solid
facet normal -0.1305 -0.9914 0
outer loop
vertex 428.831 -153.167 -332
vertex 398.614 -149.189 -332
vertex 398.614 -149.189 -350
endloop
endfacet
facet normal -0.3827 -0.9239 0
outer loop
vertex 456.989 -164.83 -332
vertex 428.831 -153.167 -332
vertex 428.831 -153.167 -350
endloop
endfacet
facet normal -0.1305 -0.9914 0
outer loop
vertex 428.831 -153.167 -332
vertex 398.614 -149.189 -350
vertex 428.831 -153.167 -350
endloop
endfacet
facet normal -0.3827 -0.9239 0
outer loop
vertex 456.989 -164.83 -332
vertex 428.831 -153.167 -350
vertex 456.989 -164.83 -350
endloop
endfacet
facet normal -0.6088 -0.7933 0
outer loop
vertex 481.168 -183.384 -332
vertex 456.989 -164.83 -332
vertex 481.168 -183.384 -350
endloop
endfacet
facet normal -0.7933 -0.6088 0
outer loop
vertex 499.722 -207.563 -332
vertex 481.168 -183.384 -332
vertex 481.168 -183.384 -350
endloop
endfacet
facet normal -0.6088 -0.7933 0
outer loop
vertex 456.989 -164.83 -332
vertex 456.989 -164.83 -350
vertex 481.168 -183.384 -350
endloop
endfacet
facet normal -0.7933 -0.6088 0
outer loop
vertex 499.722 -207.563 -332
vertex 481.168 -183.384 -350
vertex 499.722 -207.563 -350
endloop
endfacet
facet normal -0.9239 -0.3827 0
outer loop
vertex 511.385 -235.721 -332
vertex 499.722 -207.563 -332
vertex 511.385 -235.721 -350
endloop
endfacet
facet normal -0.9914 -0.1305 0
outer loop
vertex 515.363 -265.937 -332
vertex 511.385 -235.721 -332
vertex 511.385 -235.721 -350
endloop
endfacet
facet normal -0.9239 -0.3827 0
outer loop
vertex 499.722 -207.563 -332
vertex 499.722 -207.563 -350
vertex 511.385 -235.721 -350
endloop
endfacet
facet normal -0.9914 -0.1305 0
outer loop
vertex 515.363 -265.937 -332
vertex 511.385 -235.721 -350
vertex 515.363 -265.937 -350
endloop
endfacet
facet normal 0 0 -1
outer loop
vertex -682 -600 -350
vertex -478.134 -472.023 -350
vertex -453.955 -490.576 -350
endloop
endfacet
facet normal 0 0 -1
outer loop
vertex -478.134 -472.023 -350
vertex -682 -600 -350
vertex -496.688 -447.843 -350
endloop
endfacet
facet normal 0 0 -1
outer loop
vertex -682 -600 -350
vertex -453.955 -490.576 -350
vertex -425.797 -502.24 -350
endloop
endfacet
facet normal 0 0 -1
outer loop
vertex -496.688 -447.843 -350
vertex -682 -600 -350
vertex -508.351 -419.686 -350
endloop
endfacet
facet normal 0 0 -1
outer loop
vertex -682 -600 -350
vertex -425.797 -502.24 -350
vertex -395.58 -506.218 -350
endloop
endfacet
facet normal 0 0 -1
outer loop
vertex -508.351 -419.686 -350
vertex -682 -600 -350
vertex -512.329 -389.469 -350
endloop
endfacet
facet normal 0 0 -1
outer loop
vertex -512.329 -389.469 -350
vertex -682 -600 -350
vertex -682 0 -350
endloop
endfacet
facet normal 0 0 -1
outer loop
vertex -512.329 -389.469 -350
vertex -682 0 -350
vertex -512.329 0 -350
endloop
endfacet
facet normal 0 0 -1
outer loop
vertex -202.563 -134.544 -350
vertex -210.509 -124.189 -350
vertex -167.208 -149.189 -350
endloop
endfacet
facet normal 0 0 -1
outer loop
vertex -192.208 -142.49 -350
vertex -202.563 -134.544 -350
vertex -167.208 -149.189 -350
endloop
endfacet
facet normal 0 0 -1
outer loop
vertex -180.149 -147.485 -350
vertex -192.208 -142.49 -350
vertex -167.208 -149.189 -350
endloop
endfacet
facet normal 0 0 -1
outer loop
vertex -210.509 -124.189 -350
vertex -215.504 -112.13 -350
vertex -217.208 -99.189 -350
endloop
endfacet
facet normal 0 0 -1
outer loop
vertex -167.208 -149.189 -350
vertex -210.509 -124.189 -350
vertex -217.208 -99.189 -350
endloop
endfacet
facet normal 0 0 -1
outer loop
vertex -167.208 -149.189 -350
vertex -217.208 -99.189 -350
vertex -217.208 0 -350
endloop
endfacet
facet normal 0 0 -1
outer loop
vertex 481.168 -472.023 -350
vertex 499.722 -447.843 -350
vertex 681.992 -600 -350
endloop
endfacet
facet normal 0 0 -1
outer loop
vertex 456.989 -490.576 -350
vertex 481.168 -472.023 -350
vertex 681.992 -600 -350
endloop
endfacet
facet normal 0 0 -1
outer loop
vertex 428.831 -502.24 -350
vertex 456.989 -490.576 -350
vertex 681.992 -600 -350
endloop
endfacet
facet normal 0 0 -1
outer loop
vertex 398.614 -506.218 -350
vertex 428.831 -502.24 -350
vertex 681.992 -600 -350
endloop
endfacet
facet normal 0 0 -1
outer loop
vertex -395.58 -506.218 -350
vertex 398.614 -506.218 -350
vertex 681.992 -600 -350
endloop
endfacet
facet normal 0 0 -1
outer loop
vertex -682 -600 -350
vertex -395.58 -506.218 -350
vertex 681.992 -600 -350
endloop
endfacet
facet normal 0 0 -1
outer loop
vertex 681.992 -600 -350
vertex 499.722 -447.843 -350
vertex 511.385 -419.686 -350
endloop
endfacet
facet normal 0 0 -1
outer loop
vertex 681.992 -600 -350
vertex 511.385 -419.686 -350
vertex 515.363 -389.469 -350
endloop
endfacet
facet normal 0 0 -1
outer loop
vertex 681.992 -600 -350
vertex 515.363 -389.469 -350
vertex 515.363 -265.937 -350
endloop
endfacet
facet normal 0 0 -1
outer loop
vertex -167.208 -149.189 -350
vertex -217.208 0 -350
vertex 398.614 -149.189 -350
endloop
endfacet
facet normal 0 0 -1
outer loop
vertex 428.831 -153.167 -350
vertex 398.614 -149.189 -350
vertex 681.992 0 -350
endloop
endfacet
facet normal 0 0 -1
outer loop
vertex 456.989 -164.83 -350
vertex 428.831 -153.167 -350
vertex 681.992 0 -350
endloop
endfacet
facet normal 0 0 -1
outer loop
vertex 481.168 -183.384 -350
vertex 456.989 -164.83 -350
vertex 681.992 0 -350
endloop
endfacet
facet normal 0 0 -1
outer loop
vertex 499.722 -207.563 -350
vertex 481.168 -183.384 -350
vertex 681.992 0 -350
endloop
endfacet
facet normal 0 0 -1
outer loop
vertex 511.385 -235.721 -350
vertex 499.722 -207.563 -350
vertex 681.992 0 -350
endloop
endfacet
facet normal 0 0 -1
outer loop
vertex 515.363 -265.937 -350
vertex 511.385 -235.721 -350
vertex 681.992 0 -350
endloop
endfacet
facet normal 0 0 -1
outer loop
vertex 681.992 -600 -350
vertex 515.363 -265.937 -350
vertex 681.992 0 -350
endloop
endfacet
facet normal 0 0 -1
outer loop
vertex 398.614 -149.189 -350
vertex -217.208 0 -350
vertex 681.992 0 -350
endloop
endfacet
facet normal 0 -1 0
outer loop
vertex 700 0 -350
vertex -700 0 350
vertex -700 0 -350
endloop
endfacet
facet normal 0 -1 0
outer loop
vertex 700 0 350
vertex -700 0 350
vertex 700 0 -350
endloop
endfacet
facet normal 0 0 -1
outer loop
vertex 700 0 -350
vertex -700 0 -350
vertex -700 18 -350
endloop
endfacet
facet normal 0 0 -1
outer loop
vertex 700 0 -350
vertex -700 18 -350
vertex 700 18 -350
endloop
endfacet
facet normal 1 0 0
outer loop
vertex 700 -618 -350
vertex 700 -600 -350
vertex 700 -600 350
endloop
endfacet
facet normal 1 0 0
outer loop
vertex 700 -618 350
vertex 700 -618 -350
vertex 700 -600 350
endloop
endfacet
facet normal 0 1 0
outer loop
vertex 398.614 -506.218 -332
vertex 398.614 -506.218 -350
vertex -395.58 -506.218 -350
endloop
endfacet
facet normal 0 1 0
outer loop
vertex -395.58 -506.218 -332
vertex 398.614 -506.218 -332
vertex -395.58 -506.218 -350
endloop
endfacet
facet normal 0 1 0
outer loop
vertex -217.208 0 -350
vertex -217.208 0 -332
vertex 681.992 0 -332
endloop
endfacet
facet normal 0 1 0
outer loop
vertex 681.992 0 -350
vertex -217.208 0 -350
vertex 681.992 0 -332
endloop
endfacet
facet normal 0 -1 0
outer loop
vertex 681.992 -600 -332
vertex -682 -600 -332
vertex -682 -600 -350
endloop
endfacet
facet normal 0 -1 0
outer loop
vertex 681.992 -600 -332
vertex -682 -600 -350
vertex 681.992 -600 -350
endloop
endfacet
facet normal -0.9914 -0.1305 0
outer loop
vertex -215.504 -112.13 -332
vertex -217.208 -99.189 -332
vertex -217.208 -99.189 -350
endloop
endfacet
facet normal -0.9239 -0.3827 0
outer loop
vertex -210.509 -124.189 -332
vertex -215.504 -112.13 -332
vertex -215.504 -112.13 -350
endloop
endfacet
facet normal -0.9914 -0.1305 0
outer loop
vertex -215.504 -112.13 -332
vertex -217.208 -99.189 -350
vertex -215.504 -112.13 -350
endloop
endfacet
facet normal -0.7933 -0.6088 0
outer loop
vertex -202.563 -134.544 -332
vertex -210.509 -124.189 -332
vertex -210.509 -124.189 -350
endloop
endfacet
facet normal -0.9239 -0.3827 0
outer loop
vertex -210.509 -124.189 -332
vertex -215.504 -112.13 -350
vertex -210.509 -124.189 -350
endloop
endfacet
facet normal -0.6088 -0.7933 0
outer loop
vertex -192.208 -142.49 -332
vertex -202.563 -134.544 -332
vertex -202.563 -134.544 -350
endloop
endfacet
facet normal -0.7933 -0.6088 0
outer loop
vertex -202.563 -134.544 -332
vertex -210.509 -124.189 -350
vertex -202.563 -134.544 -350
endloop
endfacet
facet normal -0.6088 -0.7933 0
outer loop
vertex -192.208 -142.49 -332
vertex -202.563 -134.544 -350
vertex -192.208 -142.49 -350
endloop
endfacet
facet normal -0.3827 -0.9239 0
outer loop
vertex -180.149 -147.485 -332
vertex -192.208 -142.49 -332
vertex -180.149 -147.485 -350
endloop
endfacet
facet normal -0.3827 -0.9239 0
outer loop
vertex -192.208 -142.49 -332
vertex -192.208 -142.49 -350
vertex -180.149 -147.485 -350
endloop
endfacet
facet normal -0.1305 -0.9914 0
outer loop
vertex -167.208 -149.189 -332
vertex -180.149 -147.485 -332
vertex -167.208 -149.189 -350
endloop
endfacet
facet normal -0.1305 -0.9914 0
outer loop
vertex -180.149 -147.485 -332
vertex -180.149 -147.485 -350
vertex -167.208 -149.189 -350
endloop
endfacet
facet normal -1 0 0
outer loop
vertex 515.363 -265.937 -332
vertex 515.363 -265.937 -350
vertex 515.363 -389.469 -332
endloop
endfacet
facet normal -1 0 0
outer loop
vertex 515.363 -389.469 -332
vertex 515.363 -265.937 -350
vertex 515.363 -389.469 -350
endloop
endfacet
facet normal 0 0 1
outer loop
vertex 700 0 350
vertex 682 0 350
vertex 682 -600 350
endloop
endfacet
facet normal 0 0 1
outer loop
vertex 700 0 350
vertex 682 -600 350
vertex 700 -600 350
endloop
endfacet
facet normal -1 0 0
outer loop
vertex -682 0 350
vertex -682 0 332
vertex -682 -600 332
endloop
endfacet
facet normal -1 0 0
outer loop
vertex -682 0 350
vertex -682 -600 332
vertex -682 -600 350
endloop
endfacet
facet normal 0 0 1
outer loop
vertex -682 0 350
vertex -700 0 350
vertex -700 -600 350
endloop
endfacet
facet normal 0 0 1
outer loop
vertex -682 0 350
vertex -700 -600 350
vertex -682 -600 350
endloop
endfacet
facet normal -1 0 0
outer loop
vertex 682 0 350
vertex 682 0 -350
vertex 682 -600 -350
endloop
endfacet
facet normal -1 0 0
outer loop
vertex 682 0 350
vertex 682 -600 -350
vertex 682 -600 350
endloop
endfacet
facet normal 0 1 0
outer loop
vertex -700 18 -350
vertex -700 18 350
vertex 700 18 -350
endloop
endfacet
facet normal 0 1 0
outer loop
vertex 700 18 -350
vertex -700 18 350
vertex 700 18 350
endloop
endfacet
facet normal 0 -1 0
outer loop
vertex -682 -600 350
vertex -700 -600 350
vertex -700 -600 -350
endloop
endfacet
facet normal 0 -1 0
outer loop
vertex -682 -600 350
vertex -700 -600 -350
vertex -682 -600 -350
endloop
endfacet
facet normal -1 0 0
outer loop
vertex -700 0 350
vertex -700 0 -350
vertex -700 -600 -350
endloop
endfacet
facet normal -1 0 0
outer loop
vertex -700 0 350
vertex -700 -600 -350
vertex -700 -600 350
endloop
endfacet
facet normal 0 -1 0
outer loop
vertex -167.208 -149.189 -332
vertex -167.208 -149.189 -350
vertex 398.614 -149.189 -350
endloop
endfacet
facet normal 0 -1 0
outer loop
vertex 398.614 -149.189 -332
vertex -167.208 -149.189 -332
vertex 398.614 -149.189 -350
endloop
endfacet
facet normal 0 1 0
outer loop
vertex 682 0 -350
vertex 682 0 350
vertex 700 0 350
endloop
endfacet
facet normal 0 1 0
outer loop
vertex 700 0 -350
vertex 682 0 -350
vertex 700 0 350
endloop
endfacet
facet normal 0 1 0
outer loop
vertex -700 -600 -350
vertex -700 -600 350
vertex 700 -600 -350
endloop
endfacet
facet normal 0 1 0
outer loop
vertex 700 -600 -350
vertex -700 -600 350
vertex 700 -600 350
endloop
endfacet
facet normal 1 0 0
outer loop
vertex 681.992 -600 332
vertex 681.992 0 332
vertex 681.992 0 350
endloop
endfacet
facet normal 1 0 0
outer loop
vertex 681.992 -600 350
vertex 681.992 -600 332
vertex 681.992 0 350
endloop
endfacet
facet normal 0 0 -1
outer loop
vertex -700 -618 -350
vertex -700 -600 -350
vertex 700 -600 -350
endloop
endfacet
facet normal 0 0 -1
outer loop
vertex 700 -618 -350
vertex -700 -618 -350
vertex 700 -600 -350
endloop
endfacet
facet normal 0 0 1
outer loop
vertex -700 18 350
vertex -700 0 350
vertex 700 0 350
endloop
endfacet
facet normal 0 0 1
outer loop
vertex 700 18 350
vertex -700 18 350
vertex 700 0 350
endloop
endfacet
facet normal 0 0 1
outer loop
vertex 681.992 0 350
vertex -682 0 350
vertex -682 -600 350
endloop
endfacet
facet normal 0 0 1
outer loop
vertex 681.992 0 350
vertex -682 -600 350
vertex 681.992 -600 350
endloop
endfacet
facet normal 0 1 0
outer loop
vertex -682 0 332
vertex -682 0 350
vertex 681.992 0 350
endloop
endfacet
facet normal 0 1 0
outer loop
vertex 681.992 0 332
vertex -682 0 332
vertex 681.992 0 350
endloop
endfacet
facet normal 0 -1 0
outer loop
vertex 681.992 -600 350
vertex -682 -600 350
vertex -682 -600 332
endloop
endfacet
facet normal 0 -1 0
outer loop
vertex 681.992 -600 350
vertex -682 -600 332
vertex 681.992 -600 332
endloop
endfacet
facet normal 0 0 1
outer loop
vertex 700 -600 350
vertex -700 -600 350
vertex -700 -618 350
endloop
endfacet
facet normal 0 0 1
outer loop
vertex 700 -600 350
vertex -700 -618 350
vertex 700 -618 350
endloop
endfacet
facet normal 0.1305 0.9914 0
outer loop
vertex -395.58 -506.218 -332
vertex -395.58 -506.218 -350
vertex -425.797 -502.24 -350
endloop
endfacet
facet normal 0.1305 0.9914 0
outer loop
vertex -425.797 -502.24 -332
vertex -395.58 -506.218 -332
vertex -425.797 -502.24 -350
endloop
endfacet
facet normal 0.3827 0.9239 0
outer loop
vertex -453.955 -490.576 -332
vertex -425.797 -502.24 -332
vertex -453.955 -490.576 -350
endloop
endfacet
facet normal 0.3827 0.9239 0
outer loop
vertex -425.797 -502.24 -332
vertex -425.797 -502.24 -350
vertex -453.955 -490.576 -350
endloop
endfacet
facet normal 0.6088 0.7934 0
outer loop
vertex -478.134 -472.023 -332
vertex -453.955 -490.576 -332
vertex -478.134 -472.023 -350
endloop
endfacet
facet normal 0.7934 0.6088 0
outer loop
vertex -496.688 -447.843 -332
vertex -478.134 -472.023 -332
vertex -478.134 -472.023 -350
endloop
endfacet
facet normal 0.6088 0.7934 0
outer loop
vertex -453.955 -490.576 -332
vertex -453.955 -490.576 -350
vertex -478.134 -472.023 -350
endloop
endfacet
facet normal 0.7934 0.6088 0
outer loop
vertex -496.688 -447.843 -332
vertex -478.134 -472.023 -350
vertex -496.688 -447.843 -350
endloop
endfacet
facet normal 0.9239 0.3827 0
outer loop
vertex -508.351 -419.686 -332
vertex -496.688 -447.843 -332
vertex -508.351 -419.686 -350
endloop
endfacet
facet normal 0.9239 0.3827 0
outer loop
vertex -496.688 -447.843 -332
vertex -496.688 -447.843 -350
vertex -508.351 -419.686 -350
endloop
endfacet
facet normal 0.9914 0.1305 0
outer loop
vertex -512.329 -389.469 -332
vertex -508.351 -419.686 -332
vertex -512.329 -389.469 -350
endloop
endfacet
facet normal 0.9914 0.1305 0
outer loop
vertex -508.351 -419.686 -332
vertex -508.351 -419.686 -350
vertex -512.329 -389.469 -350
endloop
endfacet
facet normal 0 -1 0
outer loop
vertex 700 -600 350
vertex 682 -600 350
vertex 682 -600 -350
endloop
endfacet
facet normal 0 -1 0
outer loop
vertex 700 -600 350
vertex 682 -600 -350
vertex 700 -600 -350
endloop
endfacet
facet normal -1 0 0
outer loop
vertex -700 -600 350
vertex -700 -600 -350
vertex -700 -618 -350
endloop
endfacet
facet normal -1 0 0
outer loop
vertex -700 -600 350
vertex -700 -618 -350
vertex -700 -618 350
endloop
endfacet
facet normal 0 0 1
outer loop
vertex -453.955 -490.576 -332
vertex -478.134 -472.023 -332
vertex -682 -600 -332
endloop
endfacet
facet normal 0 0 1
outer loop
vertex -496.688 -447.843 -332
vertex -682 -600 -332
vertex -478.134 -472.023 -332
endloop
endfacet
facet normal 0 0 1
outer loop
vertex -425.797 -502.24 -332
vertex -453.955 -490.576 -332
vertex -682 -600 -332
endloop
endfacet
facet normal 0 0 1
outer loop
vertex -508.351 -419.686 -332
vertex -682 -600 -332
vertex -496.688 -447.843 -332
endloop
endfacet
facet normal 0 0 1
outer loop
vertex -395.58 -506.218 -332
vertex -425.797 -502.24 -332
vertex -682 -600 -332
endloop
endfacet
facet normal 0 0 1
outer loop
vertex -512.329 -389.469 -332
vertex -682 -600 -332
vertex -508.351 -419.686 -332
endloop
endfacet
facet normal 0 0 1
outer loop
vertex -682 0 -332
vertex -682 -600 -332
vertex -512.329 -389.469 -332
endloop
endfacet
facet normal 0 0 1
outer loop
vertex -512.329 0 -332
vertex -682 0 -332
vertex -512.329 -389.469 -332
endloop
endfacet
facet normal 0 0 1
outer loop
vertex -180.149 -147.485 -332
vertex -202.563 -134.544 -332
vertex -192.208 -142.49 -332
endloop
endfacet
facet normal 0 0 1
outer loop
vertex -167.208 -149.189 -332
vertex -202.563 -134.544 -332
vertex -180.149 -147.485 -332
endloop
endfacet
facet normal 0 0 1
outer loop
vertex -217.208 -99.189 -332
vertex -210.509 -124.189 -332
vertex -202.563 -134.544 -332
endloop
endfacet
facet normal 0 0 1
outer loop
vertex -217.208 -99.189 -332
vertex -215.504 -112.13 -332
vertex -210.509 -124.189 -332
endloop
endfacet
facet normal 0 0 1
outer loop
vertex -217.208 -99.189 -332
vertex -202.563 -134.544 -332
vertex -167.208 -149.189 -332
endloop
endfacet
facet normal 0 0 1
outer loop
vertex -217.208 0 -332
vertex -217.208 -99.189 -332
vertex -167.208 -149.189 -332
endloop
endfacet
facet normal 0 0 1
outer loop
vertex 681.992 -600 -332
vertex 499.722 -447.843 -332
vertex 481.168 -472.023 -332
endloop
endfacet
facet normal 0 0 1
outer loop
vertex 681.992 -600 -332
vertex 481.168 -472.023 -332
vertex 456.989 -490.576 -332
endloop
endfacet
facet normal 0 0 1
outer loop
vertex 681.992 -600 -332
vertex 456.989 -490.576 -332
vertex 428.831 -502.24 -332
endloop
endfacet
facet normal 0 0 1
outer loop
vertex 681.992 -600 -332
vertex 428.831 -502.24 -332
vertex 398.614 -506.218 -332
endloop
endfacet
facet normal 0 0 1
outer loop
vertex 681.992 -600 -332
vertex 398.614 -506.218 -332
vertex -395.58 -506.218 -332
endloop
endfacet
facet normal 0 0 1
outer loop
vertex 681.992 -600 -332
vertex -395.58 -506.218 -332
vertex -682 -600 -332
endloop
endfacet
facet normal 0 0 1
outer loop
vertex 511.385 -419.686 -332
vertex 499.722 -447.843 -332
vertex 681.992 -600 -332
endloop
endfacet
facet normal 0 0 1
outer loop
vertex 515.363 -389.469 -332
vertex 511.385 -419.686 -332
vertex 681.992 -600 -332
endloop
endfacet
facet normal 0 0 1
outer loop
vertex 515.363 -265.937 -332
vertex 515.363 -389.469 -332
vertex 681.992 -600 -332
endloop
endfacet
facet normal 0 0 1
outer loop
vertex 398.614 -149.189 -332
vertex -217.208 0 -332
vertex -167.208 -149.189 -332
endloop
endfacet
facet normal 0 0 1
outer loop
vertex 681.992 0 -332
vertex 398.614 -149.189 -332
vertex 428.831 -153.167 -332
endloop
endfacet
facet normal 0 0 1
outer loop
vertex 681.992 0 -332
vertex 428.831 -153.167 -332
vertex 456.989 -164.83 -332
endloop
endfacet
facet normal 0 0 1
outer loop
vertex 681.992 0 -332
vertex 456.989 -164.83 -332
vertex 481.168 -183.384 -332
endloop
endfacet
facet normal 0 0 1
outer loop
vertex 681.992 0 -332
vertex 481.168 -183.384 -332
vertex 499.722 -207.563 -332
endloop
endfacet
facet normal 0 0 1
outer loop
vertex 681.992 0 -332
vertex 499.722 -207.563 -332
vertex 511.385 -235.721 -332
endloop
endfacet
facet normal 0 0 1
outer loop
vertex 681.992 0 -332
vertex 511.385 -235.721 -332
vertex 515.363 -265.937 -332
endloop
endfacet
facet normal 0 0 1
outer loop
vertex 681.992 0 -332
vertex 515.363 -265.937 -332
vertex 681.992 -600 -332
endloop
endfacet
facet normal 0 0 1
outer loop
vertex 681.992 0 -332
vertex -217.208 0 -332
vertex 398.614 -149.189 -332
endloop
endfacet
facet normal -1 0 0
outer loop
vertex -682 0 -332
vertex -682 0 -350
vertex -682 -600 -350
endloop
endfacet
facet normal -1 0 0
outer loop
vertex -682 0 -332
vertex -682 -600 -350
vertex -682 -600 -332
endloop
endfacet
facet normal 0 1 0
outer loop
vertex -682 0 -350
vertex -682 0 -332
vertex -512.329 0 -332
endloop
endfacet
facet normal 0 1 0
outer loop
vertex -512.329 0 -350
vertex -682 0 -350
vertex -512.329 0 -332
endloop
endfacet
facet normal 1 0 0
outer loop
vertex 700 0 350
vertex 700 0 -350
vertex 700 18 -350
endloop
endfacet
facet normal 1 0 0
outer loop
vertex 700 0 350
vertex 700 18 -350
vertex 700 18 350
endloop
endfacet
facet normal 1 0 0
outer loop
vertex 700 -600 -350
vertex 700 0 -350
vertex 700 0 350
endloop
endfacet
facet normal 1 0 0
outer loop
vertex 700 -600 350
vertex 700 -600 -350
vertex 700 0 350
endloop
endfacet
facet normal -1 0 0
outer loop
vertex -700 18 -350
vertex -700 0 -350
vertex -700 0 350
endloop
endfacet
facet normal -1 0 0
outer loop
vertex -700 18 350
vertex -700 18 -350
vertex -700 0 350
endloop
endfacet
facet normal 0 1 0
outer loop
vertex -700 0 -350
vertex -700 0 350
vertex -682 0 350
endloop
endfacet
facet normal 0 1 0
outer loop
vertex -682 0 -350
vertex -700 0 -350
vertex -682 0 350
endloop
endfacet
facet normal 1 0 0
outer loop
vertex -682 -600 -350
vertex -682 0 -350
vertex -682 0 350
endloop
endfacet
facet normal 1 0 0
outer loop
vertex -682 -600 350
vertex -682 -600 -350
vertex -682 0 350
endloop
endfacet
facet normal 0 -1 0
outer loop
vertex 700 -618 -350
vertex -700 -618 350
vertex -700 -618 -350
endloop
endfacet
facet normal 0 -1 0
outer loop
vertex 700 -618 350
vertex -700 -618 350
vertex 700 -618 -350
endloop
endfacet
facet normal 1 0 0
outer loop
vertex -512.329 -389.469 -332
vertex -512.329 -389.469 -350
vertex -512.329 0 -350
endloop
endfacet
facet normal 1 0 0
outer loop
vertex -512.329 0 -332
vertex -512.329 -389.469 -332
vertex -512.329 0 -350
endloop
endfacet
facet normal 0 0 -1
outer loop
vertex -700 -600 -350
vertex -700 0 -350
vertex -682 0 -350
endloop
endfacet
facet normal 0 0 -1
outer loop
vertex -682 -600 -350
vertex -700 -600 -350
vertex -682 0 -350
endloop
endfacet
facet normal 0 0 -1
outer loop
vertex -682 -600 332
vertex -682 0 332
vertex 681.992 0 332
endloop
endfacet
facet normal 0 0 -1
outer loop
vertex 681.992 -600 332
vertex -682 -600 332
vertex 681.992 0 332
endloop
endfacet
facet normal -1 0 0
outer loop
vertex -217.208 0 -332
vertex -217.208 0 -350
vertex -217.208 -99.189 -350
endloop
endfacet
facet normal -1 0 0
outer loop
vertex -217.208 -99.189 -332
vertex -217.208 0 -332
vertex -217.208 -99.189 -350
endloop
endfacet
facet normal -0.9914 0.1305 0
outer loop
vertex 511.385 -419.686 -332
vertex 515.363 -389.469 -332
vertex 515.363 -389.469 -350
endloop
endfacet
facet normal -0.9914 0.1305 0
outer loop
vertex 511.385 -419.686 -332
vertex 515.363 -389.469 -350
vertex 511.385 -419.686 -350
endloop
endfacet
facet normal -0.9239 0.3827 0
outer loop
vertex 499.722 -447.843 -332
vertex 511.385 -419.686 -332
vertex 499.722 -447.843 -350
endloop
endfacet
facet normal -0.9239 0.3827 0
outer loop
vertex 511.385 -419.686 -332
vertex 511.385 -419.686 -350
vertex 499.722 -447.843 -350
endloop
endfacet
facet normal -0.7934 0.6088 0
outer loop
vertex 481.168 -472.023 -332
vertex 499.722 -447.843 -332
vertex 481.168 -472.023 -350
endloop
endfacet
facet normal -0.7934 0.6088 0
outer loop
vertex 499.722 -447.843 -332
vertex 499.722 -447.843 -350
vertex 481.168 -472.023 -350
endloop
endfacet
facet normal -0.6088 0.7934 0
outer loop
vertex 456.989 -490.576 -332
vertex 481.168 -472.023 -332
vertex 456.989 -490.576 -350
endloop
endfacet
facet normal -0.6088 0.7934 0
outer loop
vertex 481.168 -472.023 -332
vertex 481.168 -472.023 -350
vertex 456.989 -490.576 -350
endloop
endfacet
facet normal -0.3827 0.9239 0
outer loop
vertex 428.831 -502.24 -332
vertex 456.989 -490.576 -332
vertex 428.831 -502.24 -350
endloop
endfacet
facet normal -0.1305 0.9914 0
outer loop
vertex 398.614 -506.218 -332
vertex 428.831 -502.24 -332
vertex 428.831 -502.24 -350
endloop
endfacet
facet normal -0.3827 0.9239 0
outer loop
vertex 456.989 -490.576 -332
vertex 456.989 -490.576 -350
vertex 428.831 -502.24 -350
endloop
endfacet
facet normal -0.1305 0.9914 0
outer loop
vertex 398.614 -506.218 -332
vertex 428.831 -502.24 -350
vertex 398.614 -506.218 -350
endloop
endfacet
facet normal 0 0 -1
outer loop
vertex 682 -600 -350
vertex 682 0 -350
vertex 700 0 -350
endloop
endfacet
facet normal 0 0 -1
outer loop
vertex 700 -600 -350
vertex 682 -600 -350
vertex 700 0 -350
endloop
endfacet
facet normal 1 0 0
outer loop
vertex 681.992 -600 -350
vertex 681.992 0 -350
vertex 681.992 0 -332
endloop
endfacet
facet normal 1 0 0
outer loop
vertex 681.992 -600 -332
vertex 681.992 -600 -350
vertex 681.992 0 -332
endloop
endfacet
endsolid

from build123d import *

# Parameters (mm, degrees)
F0_W     = 1400
F0_H     = 700
F2_DEPTH = 18
F1_W     = 18
F1_H     = 700
F3_DEPTH = 600
F5_W     = 1363.992185
F5_H     = 18
F6_DEPTH = 600
F4_W     = 1400
F4_H     = 700
F7_DEPTH = 18
F9_DEPTH = 25


with BuildPart() as f2:
    # F0 (on Front) → F2 (new body)
    with BuildSketch(Plane.XZ):
        Rectangle(F0_W, F0_H)
    extrude(amount=-F2_DEPTH)


with BuildPart() as f3:
    # F1 (on Front) → F3 (new body)
    with BuildSketch(Plane.XZ):
        with Locations((-691, 0)):
            Rectangle(F1_W, F1_H)
        with Locations((691, 0)):
            Rectangle(F1_W, F1_H)
    extrude(amount=F3_DEPTH)


with BuildPart() as f6:
    # F5 (on Front) → F6 (new body)
    with BuildSketch(Plane.XZ):
        with Locations((-0.003908, 341)):
            Rectangle(F5_W, F5_H)
        with Locations((-0.003908, -341)):
            Rectangle(F5_W, F5_H)
    extrude(amount=F6_DEPTH)

    # F8 (on face) → F9 (cut)
    with BuildSketch(Plane(origin=(0, 0, -350), x_dir=(1, 0, 0), z_dir=(0, 0, -1))):
        with BuildLine():
            Line((398.614138, 506.217659), (-395.5805, 506.217659))
            ThreePointArc((-395.5805, 506.217659), (-478.134396, 472.022715), (-512.32934, 389.468818))
            Line((-512.32934, 389.468818), (-512.32934, 0))
            Line((-512.32934, 0), (-217.208087, 0))
            Line((-217.208087, 0), (-217.208087, 99.188645))
            ThreePointArc((-217.208087, 99.188645), (-202.563427, 134.543984), (-167.208087, 149.188645))
            Line((-167.208087, 149.188645), (398.614138, 149.188645))
            ThreePointArc((398.614138, 149.188645), (481.168034, 183.383589), (515.362978, 265.937485))
            Line((515.362978, 265.937485), (515.362978, 389.468818))
            ThreePointArc((515.362978, 389.468818), (481.168034, 472.022715), (398.614138, 506.217659))
        make_face()
    extrude(amount=-F9_DEPTH, mode=Mode.SUBTRACT)


with BuildPart() as f7:
    # F4 (on face) → F7 (new body)
    with BuildSketch(Plane.XZ.offset(600)):
        Rectangle(F4_W, F4_H)
    extrude(amount=F7_DEPTH)


solid = Compound([f2.part, f3.part, f6.part, f7.part])
